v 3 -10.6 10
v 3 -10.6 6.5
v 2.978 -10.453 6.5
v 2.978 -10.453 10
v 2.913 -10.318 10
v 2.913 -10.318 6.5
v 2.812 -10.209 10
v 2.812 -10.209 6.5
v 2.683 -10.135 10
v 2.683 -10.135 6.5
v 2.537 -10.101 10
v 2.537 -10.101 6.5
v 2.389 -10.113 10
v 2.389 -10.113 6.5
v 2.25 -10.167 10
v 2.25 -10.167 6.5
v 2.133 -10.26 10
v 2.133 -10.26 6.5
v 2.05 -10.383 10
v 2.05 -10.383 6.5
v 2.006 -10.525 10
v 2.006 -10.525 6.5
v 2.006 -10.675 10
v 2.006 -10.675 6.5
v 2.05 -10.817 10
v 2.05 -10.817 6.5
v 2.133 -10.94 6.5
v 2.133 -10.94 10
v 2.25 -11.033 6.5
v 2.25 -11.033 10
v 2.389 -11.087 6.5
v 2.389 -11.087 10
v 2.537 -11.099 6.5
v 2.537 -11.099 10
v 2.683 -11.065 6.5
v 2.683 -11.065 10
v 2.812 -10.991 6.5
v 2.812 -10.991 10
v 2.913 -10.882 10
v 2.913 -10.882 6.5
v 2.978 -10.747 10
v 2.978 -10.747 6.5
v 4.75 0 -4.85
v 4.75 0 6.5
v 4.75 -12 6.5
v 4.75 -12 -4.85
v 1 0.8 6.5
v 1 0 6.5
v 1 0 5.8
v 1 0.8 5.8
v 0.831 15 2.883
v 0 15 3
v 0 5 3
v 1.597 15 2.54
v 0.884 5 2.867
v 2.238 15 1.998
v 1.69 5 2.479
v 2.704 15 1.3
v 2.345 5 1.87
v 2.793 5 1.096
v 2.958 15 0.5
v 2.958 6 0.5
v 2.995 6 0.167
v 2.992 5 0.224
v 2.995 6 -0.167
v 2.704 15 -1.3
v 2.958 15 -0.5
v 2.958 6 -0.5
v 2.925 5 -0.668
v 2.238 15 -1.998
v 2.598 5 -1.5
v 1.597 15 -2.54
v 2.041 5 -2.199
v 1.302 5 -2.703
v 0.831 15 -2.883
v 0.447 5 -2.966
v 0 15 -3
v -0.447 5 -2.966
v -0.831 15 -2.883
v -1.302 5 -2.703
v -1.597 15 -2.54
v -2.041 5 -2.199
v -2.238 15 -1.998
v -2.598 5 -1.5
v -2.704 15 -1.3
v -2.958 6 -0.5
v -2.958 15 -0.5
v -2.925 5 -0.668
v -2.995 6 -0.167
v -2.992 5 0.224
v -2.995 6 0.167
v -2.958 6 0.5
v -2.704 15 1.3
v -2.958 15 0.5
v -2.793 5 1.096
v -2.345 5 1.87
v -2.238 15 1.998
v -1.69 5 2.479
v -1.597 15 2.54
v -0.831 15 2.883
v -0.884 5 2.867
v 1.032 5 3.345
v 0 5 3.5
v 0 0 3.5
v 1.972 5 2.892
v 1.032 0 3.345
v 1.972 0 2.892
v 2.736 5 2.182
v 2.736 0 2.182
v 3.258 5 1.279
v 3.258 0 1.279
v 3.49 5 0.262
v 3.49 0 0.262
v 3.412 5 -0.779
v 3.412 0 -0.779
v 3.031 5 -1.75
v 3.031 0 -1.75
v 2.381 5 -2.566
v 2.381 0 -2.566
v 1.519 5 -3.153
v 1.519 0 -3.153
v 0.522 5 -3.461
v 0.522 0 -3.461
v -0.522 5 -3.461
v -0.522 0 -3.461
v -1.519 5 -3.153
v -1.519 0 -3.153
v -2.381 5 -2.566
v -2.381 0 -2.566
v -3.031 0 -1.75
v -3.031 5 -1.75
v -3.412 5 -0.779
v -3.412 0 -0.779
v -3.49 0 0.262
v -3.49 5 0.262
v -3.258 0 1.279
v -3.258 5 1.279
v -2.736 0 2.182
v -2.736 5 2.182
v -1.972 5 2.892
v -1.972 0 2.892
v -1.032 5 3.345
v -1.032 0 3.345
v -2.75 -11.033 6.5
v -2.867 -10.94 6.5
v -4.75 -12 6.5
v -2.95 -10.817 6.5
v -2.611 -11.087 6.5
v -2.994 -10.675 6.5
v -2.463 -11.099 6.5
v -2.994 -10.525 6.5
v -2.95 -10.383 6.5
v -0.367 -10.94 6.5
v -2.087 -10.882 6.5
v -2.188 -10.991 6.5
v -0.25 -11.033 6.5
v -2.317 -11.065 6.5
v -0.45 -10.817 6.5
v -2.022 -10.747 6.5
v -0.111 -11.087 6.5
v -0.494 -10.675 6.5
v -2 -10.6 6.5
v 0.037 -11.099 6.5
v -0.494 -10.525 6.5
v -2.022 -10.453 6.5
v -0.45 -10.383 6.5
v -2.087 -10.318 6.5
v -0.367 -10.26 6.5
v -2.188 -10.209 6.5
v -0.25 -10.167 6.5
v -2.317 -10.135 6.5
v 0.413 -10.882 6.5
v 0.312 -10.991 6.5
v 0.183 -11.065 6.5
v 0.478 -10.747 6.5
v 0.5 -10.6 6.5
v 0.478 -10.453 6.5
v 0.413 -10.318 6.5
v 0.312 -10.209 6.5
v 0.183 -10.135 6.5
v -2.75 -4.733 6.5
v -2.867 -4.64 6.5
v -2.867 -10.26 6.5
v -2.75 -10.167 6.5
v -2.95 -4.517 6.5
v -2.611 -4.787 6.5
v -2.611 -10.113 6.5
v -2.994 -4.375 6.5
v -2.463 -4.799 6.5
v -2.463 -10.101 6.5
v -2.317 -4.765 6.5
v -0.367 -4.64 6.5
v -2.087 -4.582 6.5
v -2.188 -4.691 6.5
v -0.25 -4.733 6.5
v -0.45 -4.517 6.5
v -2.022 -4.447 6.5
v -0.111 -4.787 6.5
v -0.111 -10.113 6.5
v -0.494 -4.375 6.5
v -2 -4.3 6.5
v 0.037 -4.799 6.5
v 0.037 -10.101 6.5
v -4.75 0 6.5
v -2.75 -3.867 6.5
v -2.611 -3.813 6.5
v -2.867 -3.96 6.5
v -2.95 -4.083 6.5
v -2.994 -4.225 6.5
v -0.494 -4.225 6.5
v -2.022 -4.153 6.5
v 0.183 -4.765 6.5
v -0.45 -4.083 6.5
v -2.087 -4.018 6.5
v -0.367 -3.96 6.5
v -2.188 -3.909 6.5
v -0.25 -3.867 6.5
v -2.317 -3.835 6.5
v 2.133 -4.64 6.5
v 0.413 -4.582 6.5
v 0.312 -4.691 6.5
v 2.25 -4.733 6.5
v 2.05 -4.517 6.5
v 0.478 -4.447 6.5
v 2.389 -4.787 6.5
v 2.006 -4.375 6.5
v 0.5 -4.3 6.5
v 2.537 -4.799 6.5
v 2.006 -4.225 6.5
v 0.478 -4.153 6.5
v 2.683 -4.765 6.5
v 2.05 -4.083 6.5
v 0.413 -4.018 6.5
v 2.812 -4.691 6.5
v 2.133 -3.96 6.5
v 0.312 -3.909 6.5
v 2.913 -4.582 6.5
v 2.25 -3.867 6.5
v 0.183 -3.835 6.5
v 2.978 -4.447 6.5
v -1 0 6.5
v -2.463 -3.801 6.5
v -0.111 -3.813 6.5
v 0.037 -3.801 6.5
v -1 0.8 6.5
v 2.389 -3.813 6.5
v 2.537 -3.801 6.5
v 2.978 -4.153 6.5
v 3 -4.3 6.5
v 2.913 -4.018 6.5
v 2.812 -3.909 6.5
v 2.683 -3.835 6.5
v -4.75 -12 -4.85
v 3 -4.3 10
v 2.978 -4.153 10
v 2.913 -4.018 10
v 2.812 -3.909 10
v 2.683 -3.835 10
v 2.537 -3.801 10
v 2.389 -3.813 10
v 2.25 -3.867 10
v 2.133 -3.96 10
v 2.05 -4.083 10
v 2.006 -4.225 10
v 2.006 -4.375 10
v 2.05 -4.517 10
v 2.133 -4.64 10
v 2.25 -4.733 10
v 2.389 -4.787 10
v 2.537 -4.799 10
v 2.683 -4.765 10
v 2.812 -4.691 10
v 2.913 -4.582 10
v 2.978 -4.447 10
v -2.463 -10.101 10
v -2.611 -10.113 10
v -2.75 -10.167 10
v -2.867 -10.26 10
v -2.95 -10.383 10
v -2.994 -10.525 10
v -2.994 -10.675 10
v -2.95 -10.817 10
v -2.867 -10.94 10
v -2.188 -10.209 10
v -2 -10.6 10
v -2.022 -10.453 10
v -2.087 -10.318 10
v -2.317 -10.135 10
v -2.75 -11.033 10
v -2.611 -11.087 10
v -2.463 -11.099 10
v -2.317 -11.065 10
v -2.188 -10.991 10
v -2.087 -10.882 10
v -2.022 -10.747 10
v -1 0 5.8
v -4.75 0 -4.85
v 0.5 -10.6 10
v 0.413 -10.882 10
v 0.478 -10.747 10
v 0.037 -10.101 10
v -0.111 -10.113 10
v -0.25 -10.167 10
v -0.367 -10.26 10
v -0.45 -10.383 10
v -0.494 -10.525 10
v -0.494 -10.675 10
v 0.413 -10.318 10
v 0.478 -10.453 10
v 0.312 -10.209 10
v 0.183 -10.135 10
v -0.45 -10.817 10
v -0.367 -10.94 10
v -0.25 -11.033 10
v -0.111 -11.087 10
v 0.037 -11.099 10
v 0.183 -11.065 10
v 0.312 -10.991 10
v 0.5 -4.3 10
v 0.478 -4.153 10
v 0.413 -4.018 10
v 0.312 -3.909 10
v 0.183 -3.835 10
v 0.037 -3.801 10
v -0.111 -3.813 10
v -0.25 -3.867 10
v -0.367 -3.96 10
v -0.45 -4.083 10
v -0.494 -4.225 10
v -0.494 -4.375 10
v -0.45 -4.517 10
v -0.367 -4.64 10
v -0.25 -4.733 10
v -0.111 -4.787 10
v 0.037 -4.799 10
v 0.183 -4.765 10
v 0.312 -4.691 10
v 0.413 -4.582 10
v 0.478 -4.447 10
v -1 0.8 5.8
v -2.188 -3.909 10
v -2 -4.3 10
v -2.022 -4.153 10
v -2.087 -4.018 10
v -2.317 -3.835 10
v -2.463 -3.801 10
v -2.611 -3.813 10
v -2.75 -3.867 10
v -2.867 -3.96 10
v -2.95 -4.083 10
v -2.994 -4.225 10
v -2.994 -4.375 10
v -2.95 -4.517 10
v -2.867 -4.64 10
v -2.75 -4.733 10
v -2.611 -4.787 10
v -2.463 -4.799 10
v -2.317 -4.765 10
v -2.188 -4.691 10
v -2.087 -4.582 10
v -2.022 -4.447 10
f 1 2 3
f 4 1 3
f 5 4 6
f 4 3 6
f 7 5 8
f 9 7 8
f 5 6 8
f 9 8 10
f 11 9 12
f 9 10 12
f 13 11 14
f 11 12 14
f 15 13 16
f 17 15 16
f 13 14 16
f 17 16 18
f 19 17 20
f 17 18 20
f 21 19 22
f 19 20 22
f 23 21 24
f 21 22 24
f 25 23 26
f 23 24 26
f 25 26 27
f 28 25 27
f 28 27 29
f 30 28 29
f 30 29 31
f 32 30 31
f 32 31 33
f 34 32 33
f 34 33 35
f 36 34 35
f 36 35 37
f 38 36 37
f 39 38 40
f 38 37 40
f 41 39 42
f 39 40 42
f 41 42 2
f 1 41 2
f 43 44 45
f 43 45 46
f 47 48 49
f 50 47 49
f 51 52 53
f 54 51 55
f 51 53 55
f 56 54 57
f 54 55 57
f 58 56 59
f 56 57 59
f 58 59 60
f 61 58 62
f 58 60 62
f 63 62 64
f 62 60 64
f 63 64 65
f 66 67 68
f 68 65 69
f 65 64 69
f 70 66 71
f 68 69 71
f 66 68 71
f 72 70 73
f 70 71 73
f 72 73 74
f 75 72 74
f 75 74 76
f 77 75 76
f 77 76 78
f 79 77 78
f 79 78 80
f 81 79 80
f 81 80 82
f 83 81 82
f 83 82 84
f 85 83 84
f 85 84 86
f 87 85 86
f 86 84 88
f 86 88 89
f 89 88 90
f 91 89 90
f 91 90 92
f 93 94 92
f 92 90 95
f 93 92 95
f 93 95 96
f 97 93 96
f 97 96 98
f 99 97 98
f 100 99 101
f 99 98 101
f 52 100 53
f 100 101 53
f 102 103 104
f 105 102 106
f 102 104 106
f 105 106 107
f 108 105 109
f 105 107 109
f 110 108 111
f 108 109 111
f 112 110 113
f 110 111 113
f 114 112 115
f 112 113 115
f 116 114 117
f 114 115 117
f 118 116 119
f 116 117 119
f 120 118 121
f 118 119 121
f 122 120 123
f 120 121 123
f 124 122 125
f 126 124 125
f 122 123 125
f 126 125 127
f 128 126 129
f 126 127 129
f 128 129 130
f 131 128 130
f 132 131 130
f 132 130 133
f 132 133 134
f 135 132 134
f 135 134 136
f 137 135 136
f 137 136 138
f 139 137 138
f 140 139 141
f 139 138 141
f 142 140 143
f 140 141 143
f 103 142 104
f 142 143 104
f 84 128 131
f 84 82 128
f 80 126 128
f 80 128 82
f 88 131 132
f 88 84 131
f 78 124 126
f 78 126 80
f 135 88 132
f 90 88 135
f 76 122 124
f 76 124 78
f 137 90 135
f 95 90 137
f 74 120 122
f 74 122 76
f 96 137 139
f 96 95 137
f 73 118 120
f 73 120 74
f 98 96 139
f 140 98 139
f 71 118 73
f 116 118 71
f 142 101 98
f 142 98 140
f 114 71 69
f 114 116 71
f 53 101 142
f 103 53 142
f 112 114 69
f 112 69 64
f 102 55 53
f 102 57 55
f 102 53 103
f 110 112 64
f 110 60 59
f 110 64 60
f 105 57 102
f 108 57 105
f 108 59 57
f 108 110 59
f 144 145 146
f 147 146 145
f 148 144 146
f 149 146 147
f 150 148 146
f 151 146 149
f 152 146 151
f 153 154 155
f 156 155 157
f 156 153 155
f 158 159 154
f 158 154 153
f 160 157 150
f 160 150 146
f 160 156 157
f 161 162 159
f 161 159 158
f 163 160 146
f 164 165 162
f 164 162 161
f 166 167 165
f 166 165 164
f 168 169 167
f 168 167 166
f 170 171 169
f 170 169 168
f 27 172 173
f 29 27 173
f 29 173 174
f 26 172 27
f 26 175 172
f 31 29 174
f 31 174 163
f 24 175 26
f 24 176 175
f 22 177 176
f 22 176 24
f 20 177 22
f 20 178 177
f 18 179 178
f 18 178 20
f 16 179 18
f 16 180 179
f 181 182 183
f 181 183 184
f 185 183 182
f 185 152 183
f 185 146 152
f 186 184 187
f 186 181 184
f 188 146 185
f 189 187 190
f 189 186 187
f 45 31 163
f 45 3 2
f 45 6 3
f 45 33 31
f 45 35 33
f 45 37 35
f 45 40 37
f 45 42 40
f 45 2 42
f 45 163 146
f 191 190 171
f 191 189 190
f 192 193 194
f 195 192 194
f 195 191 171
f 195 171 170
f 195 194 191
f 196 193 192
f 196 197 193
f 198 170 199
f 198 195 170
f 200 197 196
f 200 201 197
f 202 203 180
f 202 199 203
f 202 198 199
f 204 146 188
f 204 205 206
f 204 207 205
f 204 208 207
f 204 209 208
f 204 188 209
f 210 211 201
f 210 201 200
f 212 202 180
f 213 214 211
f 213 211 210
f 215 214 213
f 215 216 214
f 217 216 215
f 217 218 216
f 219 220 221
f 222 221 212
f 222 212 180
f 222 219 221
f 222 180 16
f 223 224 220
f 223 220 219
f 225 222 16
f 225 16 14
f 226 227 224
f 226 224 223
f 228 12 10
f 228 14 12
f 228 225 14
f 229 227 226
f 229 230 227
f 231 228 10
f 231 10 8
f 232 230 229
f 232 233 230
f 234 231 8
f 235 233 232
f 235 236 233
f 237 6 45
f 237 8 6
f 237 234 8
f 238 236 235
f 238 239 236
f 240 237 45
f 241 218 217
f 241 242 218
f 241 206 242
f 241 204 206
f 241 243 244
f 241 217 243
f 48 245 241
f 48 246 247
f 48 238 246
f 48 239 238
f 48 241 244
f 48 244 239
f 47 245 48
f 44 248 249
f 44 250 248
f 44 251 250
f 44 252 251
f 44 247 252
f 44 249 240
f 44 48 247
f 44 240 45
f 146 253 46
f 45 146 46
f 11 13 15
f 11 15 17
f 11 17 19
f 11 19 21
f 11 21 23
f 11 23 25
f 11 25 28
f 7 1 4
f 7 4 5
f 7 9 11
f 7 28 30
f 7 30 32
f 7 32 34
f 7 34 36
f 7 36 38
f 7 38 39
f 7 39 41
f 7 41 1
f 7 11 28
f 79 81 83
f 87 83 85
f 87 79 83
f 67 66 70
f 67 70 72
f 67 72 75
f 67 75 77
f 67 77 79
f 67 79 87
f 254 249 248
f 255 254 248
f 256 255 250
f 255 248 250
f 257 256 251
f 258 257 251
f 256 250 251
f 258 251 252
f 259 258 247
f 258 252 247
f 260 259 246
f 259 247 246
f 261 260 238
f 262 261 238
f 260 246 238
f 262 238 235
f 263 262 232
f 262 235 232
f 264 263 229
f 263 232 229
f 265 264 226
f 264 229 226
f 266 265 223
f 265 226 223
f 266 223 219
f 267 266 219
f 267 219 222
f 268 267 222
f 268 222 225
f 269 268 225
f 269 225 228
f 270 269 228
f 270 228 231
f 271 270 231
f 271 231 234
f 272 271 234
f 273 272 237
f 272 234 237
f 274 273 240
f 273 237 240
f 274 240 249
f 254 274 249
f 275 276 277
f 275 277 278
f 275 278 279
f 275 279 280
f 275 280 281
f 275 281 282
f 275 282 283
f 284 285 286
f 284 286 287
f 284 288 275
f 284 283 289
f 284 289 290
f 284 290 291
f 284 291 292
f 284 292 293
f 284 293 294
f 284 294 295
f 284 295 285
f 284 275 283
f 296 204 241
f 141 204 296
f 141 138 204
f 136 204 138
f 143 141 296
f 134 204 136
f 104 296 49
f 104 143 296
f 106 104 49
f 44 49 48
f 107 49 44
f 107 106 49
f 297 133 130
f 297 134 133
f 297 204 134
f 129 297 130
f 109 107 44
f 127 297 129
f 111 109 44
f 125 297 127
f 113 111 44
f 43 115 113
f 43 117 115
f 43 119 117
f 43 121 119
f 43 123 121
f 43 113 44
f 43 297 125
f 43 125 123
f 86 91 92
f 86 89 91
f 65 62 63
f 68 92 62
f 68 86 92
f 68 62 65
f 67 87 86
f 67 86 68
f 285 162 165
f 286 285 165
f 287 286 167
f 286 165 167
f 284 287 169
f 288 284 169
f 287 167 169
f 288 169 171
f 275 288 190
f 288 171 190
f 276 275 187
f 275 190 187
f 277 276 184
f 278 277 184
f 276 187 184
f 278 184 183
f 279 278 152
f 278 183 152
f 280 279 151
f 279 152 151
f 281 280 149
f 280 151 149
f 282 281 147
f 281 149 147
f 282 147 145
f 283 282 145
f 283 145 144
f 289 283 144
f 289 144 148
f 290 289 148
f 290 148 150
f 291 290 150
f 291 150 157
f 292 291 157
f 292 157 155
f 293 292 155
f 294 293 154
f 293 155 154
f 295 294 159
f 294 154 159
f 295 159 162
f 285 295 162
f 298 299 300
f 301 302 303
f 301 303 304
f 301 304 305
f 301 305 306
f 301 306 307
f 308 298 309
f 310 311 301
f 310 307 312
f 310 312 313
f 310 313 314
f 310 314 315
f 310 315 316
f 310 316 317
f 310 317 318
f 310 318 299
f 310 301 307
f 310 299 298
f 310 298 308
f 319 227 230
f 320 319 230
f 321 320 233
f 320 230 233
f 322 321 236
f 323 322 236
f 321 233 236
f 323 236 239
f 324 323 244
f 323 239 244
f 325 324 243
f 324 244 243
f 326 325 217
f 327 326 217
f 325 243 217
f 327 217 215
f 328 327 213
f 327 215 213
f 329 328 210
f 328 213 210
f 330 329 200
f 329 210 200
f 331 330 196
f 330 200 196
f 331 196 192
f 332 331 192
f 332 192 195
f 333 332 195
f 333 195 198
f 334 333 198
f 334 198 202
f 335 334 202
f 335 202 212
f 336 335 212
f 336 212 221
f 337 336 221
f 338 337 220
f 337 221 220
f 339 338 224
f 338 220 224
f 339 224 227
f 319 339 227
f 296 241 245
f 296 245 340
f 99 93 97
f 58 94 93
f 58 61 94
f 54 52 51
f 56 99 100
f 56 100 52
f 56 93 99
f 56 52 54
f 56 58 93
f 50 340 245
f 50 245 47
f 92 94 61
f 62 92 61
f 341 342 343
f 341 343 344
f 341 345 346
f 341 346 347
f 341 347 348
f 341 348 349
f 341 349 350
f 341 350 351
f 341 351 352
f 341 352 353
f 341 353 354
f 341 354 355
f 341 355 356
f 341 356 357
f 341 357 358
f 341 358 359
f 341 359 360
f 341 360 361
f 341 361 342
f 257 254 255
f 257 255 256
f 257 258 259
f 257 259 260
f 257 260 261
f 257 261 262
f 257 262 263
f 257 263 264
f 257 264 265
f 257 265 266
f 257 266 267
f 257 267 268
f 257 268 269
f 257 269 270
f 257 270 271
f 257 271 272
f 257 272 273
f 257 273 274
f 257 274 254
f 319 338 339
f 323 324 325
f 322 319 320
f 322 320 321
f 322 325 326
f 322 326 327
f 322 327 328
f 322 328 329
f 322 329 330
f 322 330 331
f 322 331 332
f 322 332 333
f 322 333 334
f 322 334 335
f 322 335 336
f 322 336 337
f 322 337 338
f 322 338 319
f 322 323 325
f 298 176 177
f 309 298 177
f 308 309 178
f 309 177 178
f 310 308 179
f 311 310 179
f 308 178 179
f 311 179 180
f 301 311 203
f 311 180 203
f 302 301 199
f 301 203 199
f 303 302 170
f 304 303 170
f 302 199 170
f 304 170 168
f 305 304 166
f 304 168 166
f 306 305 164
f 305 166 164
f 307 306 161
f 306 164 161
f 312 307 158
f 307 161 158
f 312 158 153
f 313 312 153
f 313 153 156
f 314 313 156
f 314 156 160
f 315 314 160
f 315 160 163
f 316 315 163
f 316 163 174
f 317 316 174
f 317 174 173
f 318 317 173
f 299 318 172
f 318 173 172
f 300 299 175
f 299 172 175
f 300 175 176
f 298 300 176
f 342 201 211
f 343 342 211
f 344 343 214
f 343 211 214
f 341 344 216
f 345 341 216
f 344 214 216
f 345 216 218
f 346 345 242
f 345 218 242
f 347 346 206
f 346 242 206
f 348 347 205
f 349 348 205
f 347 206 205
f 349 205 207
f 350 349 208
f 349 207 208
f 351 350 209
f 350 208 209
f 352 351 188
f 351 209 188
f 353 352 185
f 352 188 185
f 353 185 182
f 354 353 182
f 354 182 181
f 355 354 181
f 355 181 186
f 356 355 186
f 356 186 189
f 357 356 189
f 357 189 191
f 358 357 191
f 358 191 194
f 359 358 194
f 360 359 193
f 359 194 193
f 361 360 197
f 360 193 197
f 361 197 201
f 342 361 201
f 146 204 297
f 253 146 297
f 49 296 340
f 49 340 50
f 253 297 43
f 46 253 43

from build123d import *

# Parameters (mm, degrees)
SKETCH2_W           = 9.5
SKETCH2_H           = 11.35
BOSS_EXTRUDE1_DEPTH = 12
SKETCH3_R           = 3.5
BOSS_EXTRUDE2_DEPTH = 5
SKETCH4_R           = 3
BOSS_EXTRUDE3_DEPTH = 10
SKETCH5_W           = 10
SKETCH5_H           = 1
CUT_EXTRUDE1_DEPTH  = 9
SKETCH6_W           = 2
SKETCH6_H           = 0.7
BOSS_EXTRUDE4_DEPTH = 0.8
SKETCH7_R           = 0.5
BOSS_EXTRUDE5_DEPTH = 3.5


with BuildPart() as part:
    # Sketch2 → Boss-Extrude1 (new body)
    with BuildSketch(Plane(origin=(0, 0, 0), x_dir=(1, 0, 0), z_dir=(0, 1, 0))):
        with Locations((0, -0.825)):
            Rectangle(SKETCH2_W, SKETCH2_H)
    extrude(amount=-BOSS_EXTRUDE1_DEPTH)

    # Sketch3 → Boss-Extrude2 (add)
    with BuildSketch(Plane(origin=(0, 0, 0), x_dir=(1, 0, 0), z_dir=(0, 1, 0))):
        with Locations(Location((0, 0, 0), (0, 0, 270))):
            Circle(SKETCH3_R)
    extrude(amount=BOSS_EXTRUDE2_DEPTH)

    # Sketch4 → Boss-Extrude3 (add)
    with BuildSketch(Plane(origin=(0, 5, 0), x_dir=(1, 0, 0), z_dir=(0, 1, 0))):
        with Locations(Location((0, 0, 0), (0, 0, 270))):
            Circle(SKETCH4_R)
    extrude(amount=BOSS_EXTRUDE3_DEPTH)

    # Sketch5 → Cut-Extrude1 (cut)
    with BuildSketch(Plane(origin=(0, 15, 0), x_dir=(1, 0, 0), z_dir=(0, 1, 0))):
        Rectangle(SKETCH5_W, SKETCH5_H)
    extrude(amount=-CUT_EXTRUDE1_DEPTH, mode=Mode.SUBTRACT)

    # Sketch6 → Boss-Extrude4 (add)
    with BuildSketch(Plane(origin=(0, 0, 0), x_dir=(1, 0, 0), z_dir=(0, 1, 0))):
        with Locations((0, -6.15)):
            Rectangle(SKETCH6_W, SKETCH6_H)
    extrude(amount=BOSS_EXTRUDE4_DEPTH)

    # Sketch7 → Boss-Extrude5 (add)
    with BuildSketch(Plane.XY.offset(6.5)):
        with Locations((-2.5, -4.3)):
            Circle(SKETCH7_R)
        with Locations((0, -4.3)):
            Circle(SKETCH7_R)
        with Locations((2.5, -4.3)):
            Circle(SKETCH7_R)
        with Locations((0, -10.6)):
            Circle(SKETCH7_R)
        with Locations((2.5, -10.6)):
            Circle(SKETCH7_R)
        with Locations((-2.5, -10.6)):
            Circle(SKETCH7_R)
    extrude(amount=BOSS_EXTRUDE5_DEPTH)


solid = part.part
